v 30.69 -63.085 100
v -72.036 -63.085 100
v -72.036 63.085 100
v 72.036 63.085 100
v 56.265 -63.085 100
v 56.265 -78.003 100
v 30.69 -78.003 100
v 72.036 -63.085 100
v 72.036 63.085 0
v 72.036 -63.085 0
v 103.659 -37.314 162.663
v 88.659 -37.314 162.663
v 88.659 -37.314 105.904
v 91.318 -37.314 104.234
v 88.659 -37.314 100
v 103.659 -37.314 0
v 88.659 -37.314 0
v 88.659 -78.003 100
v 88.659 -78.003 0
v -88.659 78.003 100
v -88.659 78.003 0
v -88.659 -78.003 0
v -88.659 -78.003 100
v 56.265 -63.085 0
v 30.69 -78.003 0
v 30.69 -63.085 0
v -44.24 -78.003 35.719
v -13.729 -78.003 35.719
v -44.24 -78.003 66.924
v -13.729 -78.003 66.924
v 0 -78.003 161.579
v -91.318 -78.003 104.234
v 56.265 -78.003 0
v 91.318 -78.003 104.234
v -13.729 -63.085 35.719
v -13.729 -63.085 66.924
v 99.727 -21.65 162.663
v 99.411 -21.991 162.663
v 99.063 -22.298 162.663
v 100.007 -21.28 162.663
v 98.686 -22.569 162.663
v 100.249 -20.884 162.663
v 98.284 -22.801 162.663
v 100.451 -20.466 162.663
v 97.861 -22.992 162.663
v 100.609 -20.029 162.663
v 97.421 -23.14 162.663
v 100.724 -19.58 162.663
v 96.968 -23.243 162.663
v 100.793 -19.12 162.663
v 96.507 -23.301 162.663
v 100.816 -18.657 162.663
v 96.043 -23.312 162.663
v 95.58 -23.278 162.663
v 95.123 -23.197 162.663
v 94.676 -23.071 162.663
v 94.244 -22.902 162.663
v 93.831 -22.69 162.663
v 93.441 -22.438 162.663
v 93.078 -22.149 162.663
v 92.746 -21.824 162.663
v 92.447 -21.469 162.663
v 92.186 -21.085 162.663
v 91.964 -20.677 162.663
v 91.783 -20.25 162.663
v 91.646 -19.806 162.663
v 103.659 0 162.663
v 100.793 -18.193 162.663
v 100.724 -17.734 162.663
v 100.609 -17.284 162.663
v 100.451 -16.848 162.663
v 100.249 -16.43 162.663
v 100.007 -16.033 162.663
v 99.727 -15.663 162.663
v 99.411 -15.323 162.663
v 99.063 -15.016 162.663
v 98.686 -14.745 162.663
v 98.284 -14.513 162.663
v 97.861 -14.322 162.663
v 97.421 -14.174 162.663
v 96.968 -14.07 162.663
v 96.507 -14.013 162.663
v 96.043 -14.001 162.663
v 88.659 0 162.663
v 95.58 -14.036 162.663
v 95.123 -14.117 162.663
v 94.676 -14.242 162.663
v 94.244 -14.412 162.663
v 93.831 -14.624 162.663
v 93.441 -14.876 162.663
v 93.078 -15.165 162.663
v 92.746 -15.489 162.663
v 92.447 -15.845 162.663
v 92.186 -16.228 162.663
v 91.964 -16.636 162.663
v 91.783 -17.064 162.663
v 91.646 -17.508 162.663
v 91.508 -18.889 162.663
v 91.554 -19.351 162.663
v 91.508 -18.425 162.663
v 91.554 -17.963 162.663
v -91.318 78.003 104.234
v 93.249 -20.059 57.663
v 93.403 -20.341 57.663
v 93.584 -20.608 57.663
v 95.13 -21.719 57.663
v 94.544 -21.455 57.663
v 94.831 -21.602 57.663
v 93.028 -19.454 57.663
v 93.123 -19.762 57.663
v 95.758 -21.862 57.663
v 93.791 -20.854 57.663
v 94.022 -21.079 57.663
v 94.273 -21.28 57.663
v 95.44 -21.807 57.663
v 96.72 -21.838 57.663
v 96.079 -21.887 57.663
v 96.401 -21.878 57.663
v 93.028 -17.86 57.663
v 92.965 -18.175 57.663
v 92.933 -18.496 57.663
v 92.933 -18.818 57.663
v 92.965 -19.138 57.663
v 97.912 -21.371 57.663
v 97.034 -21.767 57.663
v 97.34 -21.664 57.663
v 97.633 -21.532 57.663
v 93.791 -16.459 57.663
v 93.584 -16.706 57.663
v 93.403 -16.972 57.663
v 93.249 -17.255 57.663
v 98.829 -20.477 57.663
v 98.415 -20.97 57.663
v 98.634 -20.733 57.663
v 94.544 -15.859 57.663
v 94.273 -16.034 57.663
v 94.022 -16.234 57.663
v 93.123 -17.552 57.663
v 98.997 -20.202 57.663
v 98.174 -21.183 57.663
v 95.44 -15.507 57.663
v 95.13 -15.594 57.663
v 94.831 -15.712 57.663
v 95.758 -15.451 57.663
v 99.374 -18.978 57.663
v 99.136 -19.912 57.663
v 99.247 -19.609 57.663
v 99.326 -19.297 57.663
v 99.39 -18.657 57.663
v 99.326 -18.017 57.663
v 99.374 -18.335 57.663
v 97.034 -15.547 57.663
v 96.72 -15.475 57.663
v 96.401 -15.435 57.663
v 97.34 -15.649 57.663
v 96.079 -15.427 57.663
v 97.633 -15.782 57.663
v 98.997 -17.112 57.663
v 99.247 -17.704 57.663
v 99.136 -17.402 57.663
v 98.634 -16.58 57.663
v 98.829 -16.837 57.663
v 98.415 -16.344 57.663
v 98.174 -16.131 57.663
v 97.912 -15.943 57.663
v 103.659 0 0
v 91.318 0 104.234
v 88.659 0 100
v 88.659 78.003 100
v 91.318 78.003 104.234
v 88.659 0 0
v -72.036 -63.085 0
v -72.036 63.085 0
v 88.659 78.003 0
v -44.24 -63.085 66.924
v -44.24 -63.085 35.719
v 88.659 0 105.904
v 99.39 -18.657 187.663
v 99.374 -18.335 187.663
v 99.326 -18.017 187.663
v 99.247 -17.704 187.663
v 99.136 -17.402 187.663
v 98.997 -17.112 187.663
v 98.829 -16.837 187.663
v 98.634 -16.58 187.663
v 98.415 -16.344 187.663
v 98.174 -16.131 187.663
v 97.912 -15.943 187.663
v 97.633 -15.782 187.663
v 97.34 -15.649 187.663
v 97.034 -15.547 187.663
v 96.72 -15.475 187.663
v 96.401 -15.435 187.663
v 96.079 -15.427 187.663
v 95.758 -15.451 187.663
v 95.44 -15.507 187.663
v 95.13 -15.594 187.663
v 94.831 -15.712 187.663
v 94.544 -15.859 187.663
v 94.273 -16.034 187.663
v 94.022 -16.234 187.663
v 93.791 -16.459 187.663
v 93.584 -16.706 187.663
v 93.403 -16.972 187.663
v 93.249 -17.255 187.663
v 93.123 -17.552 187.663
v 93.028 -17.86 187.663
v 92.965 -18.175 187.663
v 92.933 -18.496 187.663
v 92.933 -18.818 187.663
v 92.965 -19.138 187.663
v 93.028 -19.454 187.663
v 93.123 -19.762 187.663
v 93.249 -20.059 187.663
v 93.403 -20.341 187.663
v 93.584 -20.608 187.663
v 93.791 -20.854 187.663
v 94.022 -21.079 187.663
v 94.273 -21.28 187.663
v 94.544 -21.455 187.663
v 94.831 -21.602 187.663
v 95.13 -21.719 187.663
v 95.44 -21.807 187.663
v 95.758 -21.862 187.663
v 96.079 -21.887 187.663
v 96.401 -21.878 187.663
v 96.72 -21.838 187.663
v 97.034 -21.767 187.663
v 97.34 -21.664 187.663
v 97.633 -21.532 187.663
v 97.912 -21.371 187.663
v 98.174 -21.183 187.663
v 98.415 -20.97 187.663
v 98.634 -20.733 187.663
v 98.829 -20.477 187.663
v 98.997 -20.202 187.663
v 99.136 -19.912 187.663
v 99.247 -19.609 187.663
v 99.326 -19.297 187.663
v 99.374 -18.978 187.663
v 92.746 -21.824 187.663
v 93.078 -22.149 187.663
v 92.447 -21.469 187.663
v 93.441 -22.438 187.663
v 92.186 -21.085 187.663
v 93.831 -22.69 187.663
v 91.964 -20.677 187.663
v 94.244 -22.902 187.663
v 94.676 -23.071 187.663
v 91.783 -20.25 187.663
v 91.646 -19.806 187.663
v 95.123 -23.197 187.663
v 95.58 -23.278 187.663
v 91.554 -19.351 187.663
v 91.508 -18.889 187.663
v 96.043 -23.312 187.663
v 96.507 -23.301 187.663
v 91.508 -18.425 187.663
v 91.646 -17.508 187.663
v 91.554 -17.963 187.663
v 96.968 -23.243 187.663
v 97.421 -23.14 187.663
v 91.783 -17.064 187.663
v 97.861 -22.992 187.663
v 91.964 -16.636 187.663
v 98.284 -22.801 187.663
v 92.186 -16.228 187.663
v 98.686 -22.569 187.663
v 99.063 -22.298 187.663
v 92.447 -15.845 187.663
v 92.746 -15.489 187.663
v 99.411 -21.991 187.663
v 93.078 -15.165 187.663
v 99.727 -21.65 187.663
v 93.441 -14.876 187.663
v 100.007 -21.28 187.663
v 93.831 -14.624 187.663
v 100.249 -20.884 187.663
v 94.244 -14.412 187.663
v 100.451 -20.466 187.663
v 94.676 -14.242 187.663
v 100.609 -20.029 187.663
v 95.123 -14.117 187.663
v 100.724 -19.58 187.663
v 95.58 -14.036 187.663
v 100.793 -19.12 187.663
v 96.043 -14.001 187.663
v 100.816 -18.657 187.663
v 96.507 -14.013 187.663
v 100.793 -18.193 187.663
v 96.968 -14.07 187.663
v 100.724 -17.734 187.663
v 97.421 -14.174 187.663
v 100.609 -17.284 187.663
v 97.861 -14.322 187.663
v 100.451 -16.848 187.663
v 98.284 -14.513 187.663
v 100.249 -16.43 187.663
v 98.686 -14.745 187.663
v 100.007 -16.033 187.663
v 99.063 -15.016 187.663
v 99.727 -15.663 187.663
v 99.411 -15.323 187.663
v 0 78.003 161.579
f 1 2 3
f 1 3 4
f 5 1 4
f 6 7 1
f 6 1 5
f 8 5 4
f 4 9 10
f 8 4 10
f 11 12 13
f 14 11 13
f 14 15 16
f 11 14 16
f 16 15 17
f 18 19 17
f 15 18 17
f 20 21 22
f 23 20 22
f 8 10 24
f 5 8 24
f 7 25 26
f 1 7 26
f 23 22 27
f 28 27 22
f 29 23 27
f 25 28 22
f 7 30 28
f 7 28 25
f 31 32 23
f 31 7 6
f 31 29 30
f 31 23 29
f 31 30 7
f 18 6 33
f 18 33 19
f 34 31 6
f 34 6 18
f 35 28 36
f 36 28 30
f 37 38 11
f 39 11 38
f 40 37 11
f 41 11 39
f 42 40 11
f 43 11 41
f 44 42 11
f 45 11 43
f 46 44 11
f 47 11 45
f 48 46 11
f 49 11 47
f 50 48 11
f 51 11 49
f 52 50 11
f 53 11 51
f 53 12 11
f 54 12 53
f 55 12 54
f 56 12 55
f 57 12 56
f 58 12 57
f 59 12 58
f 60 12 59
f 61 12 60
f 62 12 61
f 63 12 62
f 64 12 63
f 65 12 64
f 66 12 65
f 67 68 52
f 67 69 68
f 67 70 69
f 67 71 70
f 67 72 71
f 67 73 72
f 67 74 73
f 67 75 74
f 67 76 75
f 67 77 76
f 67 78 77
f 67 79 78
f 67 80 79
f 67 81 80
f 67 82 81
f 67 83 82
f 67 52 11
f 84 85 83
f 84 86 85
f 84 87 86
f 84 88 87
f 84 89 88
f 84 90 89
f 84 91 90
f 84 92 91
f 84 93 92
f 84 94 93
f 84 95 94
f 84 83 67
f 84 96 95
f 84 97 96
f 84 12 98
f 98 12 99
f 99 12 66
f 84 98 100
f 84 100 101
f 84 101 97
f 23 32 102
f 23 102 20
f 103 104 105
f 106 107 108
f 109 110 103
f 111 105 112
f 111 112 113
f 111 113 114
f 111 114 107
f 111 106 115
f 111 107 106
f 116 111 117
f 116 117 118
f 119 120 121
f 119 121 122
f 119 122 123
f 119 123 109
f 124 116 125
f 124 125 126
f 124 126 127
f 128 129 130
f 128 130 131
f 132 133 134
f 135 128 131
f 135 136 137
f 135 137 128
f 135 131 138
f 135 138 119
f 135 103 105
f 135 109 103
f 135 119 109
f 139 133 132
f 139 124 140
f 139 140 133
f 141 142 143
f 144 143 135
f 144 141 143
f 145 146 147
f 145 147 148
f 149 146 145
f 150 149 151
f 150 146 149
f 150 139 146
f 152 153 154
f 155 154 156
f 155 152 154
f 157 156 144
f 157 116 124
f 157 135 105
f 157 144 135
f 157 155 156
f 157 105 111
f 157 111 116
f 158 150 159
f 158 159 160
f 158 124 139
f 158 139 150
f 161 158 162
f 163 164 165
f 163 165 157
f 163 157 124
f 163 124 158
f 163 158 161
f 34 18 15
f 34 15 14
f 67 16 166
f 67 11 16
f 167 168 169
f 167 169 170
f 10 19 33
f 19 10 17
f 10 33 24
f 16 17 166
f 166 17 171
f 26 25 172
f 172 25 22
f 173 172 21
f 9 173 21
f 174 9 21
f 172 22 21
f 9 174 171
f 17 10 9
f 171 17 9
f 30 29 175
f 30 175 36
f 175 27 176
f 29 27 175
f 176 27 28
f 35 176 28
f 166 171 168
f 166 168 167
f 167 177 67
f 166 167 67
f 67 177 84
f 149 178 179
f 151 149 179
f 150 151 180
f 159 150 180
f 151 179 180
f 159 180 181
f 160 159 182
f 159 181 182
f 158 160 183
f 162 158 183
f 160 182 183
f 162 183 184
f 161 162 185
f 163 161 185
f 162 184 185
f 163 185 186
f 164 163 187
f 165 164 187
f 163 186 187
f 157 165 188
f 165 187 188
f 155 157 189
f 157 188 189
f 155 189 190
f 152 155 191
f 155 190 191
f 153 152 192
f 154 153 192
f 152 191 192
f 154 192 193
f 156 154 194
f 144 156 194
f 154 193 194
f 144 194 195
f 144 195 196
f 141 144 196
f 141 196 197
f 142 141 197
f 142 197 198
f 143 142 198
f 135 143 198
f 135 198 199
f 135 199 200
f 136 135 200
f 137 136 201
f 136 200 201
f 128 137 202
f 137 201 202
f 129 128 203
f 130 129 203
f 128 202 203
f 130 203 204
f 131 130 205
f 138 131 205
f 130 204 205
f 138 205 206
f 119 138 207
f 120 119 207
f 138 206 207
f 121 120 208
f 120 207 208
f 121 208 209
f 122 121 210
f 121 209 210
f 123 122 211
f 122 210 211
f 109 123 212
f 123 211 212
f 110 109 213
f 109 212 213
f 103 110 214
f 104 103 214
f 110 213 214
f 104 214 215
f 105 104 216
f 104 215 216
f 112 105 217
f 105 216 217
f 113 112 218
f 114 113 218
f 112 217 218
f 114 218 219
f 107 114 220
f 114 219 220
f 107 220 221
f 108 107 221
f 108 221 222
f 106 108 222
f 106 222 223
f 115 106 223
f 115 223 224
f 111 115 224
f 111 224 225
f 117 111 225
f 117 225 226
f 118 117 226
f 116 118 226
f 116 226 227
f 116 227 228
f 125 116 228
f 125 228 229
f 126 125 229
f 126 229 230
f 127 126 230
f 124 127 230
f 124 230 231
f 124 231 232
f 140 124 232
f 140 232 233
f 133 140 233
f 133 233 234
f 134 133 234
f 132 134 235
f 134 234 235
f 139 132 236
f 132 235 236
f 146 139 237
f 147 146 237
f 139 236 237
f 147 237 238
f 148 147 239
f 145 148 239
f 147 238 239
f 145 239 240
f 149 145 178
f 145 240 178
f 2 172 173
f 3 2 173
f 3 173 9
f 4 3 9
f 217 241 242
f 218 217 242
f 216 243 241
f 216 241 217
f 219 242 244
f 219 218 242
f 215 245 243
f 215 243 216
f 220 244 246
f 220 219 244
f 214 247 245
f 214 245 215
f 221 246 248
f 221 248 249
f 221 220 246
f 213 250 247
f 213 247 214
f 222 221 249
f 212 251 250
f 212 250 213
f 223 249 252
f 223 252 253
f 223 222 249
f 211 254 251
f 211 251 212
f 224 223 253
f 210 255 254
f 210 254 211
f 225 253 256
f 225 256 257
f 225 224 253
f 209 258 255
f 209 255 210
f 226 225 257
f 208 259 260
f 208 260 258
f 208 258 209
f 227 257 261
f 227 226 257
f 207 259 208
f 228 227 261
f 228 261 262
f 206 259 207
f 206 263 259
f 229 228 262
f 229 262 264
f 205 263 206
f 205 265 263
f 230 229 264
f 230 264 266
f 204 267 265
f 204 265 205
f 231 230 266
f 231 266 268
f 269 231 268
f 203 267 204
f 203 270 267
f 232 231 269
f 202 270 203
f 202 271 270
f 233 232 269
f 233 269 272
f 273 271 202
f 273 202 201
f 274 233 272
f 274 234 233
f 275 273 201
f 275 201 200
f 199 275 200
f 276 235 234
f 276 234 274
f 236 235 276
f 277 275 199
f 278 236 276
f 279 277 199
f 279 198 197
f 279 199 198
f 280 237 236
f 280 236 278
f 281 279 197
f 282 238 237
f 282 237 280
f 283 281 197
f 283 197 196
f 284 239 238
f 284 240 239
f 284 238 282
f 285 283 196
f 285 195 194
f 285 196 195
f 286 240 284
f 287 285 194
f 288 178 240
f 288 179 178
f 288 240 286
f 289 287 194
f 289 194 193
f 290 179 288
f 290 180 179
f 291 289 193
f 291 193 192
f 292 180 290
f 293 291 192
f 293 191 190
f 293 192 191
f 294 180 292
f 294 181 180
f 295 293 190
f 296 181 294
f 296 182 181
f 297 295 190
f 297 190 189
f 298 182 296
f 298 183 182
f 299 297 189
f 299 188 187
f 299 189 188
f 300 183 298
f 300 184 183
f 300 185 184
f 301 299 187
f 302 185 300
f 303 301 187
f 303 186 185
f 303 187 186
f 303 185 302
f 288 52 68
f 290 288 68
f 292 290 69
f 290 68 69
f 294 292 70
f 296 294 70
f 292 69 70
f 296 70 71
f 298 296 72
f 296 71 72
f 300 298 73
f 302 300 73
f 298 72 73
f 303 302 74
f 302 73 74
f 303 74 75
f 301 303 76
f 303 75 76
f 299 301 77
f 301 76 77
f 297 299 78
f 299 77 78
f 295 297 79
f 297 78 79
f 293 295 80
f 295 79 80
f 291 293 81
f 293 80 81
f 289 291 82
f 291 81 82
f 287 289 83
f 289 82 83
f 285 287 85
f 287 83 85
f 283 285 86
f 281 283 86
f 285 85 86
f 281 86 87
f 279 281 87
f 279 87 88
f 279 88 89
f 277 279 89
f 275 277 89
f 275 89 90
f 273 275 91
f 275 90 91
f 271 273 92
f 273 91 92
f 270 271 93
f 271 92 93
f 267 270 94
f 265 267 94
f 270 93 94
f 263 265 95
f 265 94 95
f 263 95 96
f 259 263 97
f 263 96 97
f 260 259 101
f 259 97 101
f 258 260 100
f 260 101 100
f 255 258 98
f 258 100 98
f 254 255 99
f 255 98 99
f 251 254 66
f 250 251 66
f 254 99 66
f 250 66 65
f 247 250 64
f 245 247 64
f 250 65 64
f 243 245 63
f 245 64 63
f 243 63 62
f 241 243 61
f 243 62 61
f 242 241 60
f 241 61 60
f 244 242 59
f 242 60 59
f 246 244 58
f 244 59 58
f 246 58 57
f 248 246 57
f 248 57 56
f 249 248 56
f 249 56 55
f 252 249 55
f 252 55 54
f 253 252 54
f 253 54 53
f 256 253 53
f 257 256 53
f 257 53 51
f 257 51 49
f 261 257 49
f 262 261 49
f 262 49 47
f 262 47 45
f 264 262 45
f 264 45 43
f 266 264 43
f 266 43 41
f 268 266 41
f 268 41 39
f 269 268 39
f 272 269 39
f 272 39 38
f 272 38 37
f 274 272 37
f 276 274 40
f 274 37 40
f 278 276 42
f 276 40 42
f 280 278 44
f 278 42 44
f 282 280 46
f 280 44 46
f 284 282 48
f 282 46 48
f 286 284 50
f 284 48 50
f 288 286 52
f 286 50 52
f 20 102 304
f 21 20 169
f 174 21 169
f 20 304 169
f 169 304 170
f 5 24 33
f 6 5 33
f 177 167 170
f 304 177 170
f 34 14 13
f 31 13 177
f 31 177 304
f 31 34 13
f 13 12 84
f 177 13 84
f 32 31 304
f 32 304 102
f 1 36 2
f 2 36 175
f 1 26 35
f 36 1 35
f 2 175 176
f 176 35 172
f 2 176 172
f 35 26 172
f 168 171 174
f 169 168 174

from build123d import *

# Parameters (mm, degrees)
F1_DEPTH  = 100
F2_W      = 30.510824
F2_H      = 31.205505
F3_DEPTH  = 25
F5_DEPTH  = 156.006396
F6_DEPTH  = 156.006396
F7_W      = 37.313528
F7_H      = 100
F7_H_2    = 62.66261
F8_DEPTH  = 15
F9_R      = 4.65702
F10_DEPTH = 25
F11_R     = 3.230766
F12_DEPTH = 130


with BuildPart() as f1:
    # F0 (on Top) → F1 (new body)
    with BuildSketch(Plane.XY):
        Polygon((56.264594, -78.003198), (88.659361, -78.003198), (88.659361, 78.003198), (-88.659361, 78.003198), (-88.659361, -78.003198), (30.689791, -78.003198), (30.689791, -63.084543), (-72.03573, -63.084543), (-72.03573, 63.084543), (72.03573, 63.084543), (72.03573, -63.084543), (56.264594, -63.084543), align=None)
    extrude(amount=F1_DEPTH)

    # F2 (on face) → F3 (cut)
    with BuildSketch(Plane.XZ.offset(78.003198)):
        with Locations((-28.984785, 51.321357)):
            Rectangle(F2_W, F2_H)
    extrude(amount=-F3_DEPTH, mode=Mode.SUBTRACT)

    # F4 (on face) → F5 (join, through all)
    with BuildSketch(Plane.XZ.offset(78.003198)):
        Polygon((88.659361, 100), (0, 155.675024), (-88.659361, 100), (30.689791, 100), (56.264594, 100), align=None)
    extrude(amount=-F5_DEPTH)

    # F4 (on face) → F6 (join, through all)
    with BuildSketch(Plane.XZ.offset(78.003198)):
        Polygon((-88.659361, 100), (0, 155.675024), (88.659361, 100), (91.31838, 104.234338), (0, 161.579134), (-91.31838, 104.234338), align=None)
    extrude(amount=-F6_DEPTH)

    # F7 (on face) → F8 (join)
    with BuildSketch(Plane.YZ.offset(88.659361)):
        with Locations((-18.656764, 50)):
            Rectangle(F7_W, F7_H)
        with Locations((-18.656764, 131.331305)):
            Rectangle(F7_W, F7_H_2)
    extrude(amount=F8_DEPTH)

    # F9 (on face) → F10 (join)
    with BuildSketch(Plane.XY.offset(162.66261)):
        with Locations((96.159361, -18.656764)):
            Circle(F9_R)
    extrude(amount=F10_DEPTH)

    # F11 (on face) → F12 (cut)
    with BuildSketch(Plane.XY.offset(187.66261)):
        with Locations((96.159361, -18.656764)):
            Circle(F11_R)
    extrude(amount=-F12_DEPTH, mode=Mode.SUBTRACT)


solid = f1.part
